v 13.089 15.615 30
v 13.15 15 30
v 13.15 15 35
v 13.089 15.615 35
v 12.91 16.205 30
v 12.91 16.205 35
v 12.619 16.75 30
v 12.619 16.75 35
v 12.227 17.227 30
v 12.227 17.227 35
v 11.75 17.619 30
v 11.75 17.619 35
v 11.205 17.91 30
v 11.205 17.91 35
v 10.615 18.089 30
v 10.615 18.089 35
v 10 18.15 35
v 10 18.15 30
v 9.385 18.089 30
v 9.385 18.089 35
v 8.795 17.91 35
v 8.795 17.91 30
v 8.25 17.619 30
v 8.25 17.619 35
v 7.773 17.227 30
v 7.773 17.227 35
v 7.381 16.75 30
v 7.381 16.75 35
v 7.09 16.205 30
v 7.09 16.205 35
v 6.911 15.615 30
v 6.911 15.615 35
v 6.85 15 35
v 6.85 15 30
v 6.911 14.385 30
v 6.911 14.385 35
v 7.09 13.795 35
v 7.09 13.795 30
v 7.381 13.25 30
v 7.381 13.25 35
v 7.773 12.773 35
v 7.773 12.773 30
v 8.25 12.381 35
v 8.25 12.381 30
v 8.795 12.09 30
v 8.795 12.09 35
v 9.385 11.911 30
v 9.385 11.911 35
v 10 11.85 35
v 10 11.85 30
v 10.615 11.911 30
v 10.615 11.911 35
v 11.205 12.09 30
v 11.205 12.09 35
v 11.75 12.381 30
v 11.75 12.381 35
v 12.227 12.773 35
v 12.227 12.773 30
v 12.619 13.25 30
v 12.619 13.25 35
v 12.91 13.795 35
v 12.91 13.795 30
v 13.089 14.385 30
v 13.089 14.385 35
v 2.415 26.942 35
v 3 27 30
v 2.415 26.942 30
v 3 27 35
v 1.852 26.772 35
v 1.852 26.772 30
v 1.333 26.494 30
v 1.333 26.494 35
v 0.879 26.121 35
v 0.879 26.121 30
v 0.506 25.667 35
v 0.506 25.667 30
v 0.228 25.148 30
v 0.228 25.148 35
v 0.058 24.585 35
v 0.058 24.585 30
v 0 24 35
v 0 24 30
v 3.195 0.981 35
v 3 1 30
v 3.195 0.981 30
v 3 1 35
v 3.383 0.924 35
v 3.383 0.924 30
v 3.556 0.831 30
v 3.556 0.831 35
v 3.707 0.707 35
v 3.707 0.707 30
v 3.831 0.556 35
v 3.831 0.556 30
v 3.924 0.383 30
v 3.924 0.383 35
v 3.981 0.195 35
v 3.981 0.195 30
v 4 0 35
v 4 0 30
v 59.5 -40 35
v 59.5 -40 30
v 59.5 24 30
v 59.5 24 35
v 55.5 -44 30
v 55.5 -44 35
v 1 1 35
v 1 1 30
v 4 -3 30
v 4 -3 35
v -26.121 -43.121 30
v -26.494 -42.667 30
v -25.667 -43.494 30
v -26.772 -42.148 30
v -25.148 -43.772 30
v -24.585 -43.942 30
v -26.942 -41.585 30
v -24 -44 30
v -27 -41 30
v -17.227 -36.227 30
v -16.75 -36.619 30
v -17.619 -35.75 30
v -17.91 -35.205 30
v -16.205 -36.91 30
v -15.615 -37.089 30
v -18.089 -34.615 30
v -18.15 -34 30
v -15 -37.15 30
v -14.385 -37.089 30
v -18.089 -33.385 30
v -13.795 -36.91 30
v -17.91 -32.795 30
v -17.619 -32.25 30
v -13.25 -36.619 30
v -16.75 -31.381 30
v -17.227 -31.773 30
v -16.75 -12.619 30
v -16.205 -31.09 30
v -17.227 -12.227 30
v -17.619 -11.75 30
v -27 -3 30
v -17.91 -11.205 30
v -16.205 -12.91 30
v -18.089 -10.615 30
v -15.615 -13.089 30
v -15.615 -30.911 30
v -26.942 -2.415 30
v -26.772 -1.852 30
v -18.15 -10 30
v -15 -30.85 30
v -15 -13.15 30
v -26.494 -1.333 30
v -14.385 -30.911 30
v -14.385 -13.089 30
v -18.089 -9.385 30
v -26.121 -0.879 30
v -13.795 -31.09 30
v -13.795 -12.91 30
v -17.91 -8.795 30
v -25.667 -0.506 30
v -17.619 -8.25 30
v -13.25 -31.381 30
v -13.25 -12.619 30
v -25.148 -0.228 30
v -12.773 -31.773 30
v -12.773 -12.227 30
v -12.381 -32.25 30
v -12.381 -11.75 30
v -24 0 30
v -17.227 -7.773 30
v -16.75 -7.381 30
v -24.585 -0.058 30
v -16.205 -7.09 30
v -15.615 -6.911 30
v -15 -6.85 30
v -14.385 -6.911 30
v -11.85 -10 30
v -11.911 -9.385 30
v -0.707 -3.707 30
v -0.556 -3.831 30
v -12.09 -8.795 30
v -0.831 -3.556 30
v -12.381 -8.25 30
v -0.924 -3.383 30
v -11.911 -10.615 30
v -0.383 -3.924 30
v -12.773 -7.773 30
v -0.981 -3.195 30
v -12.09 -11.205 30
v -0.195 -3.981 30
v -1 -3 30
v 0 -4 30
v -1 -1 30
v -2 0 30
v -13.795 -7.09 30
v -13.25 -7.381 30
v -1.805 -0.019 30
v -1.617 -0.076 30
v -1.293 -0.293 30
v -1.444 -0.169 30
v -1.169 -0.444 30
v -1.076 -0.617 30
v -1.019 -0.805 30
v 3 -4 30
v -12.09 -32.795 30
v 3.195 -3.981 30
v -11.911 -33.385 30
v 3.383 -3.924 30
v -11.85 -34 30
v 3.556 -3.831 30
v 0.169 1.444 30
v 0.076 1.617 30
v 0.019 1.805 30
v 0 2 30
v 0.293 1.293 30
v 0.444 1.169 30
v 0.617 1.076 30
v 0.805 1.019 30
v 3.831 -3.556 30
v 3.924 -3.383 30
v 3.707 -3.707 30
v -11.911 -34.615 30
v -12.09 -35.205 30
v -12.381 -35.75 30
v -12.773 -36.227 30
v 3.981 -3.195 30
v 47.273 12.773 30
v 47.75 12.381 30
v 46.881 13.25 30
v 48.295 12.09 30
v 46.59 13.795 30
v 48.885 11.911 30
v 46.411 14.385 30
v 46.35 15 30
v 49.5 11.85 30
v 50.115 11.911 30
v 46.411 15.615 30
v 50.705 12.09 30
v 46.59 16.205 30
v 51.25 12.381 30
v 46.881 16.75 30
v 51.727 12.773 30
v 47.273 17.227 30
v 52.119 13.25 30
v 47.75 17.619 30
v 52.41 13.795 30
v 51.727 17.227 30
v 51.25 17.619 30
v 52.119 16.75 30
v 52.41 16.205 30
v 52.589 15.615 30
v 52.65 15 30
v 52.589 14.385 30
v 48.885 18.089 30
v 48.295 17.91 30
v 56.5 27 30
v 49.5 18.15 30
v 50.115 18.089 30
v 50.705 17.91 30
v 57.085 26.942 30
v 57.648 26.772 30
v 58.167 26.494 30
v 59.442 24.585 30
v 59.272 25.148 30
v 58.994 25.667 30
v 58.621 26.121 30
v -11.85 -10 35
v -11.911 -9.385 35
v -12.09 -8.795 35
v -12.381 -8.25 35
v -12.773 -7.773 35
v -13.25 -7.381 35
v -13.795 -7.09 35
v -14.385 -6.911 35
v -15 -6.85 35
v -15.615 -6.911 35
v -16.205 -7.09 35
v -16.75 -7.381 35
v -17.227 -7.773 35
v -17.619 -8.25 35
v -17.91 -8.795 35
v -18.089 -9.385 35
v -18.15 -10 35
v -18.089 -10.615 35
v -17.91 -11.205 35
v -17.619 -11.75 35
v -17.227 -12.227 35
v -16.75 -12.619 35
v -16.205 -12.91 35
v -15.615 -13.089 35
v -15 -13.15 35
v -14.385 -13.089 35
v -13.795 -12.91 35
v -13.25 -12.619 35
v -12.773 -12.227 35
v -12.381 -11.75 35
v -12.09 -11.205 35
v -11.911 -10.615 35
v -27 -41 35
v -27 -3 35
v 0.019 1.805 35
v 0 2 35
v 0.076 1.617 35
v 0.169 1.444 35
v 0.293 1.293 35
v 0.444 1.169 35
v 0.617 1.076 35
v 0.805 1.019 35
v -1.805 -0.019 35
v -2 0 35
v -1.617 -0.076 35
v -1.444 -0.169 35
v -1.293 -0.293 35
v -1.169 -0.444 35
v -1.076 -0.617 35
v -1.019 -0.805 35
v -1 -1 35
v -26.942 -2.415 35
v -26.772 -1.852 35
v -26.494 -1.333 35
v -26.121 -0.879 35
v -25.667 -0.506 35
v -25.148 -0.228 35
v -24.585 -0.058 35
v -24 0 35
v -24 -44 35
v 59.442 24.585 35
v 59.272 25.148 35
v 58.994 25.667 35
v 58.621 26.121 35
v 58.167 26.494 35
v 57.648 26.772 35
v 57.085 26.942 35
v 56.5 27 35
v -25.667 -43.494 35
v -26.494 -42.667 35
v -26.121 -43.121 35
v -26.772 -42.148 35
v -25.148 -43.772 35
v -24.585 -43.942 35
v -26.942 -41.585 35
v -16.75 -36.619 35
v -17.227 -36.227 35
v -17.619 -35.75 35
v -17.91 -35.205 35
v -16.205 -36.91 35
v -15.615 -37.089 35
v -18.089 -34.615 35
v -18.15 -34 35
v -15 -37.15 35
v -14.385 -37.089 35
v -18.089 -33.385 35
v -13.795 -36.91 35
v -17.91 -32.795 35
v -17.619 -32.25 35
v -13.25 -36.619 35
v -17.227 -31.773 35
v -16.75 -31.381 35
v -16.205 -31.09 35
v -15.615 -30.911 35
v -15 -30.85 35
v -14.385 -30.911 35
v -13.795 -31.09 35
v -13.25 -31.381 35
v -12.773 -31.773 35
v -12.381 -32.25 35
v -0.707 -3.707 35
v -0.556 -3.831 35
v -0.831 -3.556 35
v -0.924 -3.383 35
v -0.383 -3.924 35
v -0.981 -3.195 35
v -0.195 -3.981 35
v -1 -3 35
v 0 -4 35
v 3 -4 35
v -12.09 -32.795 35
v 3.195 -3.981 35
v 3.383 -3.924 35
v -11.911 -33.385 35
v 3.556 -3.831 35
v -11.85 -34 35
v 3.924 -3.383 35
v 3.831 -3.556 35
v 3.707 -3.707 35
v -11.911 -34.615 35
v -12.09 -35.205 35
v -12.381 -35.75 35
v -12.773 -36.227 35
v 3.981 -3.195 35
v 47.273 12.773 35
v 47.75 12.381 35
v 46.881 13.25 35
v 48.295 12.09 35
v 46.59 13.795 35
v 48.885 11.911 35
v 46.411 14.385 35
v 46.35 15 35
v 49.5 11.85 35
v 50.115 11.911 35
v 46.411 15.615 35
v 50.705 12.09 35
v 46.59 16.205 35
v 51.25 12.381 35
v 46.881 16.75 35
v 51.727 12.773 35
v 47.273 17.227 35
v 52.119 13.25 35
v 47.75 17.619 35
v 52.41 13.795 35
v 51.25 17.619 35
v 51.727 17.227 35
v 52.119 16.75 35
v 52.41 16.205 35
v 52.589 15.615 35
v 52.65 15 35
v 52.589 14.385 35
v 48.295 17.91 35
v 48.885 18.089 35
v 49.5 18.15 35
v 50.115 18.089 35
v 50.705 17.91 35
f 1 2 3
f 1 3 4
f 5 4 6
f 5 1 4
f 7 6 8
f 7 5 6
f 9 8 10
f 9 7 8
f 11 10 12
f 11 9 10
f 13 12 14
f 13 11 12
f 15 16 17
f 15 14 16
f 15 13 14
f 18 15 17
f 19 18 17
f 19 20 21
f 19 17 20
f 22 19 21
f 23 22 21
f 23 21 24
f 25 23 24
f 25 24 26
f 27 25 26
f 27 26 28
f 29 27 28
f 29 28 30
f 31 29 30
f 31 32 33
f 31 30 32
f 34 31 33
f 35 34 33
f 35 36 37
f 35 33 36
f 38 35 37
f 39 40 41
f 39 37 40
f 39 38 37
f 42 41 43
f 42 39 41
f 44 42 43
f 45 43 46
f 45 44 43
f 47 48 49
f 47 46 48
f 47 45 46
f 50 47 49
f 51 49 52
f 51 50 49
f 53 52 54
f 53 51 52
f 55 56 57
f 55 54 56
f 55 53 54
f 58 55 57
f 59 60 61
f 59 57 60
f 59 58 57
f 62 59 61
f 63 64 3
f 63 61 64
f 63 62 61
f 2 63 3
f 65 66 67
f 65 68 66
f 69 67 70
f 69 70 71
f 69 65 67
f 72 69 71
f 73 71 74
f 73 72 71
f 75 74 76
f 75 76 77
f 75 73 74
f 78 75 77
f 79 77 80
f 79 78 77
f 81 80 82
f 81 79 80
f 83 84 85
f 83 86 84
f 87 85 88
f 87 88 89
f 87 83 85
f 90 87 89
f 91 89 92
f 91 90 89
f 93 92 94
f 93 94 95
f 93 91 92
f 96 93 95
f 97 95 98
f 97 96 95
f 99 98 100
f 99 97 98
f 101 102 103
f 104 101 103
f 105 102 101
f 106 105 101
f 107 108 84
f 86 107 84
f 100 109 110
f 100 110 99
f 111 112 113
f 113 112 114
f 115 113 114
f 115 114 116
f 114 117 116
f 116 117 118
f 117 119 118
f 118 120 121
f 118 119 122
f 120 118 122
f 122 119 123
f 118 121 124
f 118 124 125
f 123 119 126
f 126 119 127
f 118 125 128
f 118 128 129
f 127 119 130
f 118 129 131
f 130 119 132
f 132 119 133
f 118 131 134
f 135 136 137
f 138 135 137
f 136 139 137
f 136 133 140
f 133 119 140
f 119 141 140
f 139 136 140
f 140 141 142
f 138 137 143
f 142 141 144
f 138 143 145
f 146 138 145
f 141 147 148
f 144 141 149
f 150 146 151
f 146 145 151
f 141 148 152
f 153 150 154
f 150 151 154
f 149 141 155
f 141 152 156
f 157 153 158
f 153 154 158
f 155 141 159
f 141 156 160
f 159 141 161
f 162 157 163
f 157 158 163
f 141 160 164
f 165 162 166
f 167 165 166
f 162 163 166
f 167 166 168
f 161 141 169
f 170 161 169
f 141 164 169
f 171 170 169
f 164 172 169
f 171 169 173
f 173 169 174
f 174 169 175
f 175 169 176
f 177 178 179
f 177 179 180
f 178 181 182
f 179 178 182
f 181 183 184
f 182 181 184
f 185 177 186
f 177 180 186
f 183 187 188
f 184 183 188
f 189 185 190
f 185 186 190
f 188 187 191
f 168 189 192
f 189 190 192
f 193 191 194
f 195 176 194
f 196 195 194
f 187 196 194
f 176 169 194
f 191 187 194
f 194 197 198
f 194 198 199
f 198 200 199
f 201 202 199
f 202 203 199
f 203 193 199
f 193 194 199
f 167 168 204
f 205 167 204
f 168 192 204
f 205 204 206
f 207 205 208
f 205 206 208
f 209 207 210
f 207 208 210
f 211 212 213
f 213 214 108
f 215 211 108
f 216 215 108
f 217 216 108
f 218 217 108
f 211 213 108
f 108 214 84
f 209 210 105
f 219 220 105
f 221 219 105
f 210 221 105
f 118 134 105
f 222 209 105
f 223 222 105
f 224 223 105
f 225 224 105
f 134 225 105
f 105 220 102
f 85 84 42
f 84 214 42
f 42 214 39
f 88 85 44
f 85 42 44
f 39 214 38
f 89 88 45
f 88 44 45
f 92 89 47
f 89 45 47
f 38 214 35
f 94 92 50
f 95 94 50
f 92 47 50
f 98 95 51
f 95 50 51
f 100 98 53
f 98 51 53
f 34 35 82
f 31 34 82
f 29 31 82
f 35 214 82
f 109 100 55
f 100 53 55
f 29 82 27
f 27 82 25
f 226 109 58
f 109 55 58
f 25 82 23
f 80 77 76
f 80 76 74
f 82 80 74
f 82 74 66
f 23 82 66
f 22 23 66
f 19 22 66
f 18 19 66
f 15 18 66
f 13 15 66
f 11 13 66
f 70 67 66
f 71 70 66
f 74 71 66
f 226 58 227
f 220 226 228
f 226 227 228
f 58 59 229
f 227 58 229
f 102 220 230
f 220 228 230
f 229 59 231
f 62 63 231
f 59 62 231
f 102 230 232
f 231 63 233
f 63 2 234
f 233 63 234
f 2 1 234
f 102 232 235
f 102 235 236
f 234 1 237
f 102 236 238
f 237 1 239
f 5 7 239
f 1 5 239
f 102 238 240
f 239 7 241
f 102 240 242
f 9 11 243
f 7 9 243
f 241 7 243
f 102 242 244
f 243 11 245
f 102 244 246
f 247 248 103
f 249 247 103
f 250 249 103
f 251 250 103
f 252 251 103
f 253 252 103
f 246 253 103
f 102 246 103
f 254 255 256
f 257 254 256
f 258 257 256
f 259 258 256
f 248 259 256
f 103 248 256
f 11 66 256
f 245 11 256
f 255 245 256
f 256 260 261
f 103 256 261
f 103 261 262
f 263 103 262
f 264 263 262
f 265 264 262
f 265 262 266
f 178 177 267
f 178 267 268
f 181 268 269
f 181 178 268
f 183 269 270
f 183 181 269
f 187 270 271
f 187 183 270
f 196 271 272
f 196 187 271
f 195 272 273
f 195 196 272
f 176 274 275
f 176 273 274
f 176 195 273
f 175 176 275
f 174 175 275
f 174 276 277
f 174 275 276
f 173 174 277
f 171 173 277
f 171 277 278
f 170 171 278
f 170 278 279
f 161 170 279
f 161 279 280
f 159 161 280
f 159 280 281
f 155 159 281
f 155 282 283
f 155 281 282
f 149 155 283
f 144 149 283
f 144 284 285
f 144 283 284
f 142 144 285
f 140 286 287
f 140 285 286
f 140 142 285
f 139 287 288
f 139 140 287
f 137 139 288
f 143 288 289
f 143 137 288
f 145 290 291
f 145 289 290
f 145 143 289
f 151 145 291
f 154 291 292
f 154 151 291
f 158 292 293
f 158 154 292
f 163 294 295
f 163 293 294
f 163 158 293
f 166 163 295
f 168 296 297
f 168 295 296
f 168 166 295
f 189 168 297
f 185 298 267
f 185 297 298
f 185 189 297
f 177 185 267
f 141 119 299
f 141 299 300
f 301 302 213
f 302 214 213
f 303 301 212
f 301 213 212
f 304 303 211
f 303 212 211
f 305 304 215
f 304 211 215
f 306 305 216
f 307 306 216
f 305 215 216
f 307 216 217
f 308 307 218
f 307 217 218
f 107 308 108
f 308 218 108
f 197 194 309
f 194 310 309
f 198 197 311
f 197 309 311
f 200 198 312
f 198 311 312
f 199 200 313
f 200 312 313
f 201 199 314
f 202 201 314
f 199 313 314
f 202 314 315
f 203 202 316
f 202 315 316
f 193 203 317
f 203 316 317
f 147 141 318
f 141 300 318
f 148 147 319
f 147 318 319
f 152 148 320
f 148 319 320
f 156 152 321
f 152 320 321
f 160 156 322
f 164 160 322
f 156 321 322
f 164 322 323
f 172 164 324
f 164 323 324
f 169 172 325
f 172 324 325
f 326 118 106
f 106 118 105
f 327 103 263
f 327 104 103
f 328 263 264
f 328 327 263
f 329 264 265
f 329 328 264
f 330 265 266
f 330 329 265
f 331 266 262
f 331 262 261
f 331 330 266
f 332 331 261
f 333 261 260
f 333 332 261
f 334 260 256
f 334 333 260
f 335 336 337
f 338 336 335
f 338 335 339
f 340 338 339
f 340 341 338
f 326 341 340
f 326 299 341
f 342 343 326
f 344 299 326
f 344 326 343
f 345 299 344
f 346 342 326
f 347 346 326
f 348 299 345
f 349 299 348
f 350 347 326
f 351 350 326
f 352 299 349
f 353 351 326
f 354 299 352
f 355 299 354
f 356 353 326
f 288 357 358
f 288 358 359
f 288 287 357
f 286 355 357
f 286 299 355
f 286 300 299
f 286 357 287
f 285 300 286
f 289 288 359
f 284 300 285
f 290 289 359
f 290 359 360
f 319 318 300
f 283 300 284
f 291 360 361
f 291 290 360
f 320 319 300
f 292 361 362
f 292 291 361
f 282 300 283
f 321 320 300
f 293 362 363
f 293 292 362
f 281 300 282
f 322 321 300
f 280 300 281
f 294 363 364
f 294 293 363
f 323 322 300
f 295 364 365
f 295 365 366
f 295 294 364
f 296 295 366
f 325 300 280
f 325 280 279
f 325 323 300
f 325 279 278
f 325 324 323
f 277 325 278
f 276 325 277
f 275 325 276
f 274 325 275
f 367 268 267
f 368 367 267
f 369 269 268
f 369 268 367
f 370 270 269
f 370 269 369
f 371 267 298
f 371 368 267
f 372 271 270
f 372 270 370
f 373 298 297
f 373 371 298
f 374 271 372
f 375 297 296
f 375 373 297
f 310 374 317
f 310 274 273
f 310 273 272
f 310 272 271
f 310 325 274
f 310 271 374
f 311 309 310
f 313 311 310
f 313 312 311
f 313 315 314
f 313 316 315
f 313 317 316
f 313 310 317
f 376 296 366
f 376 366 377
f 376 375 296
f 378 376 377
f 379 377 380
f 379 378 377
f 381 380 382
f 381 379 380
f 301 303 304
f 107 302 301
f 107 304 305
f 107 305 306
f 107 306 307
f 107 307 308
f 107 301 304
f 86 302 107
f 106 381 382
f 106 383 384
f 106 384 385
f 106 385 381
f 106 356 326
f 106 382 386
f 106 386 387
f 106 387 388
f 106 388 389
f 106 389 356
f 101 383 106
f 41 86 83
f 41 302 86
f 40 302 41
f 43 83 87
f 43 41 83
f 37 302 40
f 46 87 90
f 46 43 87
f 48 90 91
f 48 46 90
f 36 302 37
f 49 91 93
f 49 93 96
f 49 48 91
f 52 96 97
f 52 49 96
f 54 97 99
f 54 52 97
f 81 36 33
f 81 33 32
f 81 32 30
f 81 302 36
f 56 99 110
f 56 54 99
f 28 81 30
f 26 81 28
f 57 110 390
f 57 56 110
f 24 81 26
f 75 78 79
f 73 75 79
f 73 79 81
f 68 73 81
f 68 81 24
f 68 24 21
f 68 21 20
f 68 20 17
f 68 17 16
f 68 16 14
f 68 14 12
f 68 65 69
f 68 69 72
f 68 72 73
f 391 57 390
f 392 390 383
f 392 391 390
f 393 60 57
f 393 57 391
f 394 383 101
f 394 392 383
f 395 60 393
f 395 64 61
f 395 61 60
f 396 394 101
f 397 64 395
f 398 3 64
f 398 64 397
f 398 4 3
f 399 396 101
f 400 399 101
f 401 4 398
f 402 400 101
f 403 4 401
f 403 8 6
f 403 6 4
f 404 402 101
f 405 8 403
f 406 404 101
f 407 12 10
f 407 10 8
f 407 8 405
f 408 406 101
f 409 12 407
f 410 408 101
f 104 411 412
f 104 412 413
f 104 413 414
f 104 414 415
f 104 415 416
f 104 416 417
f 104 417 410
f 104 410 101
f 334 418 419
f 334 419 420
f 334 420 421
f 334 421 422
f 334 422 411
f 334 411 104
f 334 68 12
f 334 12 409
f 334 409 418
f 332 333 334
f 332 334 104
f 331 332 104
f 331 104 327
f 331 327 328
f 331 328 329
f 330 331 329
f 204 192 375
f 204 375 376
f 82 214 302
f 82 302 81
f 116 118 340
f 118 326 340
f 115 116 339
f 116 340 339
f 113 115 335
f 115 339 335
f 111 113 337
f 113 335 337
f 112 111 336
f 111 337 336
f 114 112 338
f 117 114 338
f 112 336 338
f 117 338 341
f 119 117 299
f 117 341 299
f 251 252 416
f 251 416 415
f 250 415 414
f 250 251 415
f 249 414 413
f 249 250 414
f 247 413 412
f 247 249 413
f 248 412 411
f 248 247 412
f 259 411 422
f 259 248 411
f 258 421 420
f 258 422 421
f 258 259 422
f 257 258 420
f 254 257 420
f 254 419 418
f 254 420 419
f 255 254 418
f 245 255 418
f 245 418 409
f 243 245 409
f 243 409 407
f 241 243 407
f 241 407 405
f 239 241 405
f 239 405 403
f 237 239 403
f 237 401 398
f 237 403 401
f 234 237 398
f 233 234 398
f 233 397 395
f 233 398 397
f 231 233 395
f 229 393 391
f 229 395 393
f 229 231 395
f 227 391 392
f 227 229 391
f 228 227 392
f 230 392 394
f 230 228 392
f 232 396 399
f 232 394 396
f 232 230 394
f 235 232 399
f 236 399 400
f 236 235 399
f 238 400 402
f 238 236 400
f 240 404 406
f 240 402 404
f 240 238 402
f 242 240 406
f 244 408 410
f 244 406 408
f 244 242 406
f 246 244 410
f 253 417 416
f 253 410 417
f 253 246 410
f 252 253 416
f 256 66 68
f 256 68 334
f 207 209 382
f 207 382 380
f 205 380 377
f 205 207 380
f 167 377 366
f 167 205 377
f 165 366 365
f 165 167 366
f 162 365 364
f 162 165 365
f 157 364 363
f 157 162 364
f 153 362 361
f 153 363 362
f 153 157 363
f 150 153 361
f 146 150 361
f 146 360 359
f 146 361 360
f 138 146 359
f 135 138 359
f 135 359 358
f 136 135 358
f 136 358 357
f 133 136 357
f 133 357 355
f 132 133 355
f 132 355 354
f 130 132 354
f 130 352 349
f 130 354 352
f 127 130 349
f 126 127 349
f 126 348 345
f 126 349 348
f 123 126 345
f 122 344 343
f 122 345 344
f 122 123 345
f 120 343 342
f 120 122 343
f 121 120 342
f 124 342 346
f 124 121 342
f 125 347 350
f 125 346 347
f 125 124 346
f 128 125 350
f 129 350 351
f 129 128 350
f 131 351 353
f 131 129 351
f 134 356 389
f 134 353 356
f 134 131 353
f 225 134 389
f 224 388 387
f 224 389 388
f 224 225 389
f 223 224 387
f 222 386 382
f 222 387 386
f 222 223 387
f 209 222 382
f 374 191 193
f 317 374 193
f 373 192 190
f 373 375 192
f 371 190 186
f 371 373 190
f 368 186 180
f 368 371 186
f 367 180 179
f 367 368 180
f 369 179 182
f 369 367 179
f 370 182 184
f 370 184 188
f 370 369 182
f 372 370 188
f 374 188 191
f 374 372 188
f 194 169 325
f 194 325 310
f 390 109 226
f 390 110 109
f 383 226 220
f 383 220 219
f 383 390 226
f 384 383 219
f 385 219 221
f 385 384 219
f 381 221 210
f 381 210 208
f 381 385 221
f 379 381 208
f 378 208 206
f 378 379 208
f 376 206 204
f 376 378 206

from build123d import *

# Parameters (mm, degrees)
CYLINDER056_R     = 3.15
CYLINDER056_DEPTH = 10
CYLINDER055_R     = 3.15
CYLINDER055_DEPTH = 10
CYLINDER_R        = 3.15
CYLINDER_DEPTH    = 10
CYLINDER057_R     = 3.15
CYLINDER057_DEPTH = 10
BOX002_W          = 5
BOX002_H          = 5
BOX002_DEPTH      = 5
BOX001_W          = 59.5
BOX001_H          = 27
BOX001_DEPTH      = 5
BOX_W             = 86.5
BOX_H             = 44
BOX_DEPTH         = 5
CHAMFER_SIZE      = 4
FILLET_R          = 3
FILLET001_R       = 1


with BuildPart() as cylinder056:
    # Cylinder056 → Cylinder056 (new body)
    with BuildSketch(Plane(origin=(-15, -34, 26.5), x_dir=(1, 0, 0), z_dir=(0, 0, 1))):
        Circle(CYLINDER056_R)
    extrude(amount=CYLINDER056_DEPTH)


with BuildPart() as cylinder055:
    # Cylinder055 → Cylinder055 (new body)
    with BuildSketch(Plane(origin=(10, 15, 26.5), x_dir=(1, 0, 0), z_dir=(0, 0, 1))):
        Circle(CYLINDER055_R)
    extrude(amount=CYLINDER055_DEPTH)


with BuildPart() as cylinder:
    # Cylinder → Cylinder (new body)
    with BuildSketch(Plane(origin=(-15, -10, 26.5), x_dir=(1, 0, 0), z_dir=(0, 0, 1))):
        Circle(CYLINDER_R)
    extrude(amount=CYLINDER_DEPTH)


with BuildPart() as fusion006002011004053036004001002:
    # Cylinder057 → Cylinder057 (new body)
    with BuildSketch(Plane(origin=(49.5, 15, 26.5), x_dir=(1, 0, 0), z_dir=(0, 0, 1))):
        Circle(CYLINDER057_R)
    extrude(amount=CYLINDER057_DEPTH)

    # Fusion006002011004053036004001002: union Cylinder056, Cylinder055, Cylinder
    add(cylinder056.part)
    add(cylinder055.part)
    add(cylinder.part)


with BuildPart() as cube002:
    # Box002 → Box002 (new body)
    with BuildSketch(Plane(origin=(-1, -4, 30), x_dir=(1, 0, 0), z_dir=(0, 0, 1))):
        with Locations((2.5, 2.5)):
            Rectangle(BOX002_W, BOX002_H)
    extrude(amount=BOX002_DEPTH)


with BuildPart() as cube001:
    # Box001 → Box001 (new body)
    with BuildSketch(Plane.XY.offset(30)):
        with Locations((29.75, 13.5)):
            Rectangle(BOX001_W, BOX001_H)
    extrude(amount=BOX001_DEPTH)


with BuildPart() as base_plate:
    # Box → Box (new body)
    with BuildSketch(Plane(origin=(-27, -44, 30), x_dir=(1, 0, 0), z_dir=(0, 0, 1))):
        with Locations((43.25, 22)):
            Rectangle(BOX_W, BOX_H)
    extrude(amount=BOX_DEPTH)

    # Fusion: union Cube001
    add(cube001.part)

    # Cut: cut Cube002
    add(cube002.part, mode=Mode.SUBTRACT)

    # Chamfer
    chamfer_edges = [base_plate.edges().sort_by_distance(p)[0] for p in [
        (59.5, -44, 32.5),
    ]]
    chamfer(chamfer_edges, length=CHAMFER_SIZE)

    # Fillet
    fillet_edges = [base_plate.edges().sort_by_distance(p)[0] for p in [
        (-27, -44, 32.5),
        (-27, 0, 32.5),
        (59.5, 27, 32.5),
        (0, 27, 32.5),
    ]]
    fillet(fillet_edges, radius=FILLET_R)

    # Fillet001
    fillet001_edges = [base_plate.edges().sort_by_distance(p)[0] for p in [
        (-1, 0, 32.5),
        (4, -4, 32.5),
        (4, 1, 32.5),
        (-1, -4, 32.5),
        (0, 1, 32.5),
    ]]
    fillet(fillet001_edges, radius=FILLET001_R)

    # Cut002008: cut Fusion006002011004053036004001002
    add(fusion006002011004053036004001002.part, mode=Mode.SUBTRACT)


solid = base_plate.part
